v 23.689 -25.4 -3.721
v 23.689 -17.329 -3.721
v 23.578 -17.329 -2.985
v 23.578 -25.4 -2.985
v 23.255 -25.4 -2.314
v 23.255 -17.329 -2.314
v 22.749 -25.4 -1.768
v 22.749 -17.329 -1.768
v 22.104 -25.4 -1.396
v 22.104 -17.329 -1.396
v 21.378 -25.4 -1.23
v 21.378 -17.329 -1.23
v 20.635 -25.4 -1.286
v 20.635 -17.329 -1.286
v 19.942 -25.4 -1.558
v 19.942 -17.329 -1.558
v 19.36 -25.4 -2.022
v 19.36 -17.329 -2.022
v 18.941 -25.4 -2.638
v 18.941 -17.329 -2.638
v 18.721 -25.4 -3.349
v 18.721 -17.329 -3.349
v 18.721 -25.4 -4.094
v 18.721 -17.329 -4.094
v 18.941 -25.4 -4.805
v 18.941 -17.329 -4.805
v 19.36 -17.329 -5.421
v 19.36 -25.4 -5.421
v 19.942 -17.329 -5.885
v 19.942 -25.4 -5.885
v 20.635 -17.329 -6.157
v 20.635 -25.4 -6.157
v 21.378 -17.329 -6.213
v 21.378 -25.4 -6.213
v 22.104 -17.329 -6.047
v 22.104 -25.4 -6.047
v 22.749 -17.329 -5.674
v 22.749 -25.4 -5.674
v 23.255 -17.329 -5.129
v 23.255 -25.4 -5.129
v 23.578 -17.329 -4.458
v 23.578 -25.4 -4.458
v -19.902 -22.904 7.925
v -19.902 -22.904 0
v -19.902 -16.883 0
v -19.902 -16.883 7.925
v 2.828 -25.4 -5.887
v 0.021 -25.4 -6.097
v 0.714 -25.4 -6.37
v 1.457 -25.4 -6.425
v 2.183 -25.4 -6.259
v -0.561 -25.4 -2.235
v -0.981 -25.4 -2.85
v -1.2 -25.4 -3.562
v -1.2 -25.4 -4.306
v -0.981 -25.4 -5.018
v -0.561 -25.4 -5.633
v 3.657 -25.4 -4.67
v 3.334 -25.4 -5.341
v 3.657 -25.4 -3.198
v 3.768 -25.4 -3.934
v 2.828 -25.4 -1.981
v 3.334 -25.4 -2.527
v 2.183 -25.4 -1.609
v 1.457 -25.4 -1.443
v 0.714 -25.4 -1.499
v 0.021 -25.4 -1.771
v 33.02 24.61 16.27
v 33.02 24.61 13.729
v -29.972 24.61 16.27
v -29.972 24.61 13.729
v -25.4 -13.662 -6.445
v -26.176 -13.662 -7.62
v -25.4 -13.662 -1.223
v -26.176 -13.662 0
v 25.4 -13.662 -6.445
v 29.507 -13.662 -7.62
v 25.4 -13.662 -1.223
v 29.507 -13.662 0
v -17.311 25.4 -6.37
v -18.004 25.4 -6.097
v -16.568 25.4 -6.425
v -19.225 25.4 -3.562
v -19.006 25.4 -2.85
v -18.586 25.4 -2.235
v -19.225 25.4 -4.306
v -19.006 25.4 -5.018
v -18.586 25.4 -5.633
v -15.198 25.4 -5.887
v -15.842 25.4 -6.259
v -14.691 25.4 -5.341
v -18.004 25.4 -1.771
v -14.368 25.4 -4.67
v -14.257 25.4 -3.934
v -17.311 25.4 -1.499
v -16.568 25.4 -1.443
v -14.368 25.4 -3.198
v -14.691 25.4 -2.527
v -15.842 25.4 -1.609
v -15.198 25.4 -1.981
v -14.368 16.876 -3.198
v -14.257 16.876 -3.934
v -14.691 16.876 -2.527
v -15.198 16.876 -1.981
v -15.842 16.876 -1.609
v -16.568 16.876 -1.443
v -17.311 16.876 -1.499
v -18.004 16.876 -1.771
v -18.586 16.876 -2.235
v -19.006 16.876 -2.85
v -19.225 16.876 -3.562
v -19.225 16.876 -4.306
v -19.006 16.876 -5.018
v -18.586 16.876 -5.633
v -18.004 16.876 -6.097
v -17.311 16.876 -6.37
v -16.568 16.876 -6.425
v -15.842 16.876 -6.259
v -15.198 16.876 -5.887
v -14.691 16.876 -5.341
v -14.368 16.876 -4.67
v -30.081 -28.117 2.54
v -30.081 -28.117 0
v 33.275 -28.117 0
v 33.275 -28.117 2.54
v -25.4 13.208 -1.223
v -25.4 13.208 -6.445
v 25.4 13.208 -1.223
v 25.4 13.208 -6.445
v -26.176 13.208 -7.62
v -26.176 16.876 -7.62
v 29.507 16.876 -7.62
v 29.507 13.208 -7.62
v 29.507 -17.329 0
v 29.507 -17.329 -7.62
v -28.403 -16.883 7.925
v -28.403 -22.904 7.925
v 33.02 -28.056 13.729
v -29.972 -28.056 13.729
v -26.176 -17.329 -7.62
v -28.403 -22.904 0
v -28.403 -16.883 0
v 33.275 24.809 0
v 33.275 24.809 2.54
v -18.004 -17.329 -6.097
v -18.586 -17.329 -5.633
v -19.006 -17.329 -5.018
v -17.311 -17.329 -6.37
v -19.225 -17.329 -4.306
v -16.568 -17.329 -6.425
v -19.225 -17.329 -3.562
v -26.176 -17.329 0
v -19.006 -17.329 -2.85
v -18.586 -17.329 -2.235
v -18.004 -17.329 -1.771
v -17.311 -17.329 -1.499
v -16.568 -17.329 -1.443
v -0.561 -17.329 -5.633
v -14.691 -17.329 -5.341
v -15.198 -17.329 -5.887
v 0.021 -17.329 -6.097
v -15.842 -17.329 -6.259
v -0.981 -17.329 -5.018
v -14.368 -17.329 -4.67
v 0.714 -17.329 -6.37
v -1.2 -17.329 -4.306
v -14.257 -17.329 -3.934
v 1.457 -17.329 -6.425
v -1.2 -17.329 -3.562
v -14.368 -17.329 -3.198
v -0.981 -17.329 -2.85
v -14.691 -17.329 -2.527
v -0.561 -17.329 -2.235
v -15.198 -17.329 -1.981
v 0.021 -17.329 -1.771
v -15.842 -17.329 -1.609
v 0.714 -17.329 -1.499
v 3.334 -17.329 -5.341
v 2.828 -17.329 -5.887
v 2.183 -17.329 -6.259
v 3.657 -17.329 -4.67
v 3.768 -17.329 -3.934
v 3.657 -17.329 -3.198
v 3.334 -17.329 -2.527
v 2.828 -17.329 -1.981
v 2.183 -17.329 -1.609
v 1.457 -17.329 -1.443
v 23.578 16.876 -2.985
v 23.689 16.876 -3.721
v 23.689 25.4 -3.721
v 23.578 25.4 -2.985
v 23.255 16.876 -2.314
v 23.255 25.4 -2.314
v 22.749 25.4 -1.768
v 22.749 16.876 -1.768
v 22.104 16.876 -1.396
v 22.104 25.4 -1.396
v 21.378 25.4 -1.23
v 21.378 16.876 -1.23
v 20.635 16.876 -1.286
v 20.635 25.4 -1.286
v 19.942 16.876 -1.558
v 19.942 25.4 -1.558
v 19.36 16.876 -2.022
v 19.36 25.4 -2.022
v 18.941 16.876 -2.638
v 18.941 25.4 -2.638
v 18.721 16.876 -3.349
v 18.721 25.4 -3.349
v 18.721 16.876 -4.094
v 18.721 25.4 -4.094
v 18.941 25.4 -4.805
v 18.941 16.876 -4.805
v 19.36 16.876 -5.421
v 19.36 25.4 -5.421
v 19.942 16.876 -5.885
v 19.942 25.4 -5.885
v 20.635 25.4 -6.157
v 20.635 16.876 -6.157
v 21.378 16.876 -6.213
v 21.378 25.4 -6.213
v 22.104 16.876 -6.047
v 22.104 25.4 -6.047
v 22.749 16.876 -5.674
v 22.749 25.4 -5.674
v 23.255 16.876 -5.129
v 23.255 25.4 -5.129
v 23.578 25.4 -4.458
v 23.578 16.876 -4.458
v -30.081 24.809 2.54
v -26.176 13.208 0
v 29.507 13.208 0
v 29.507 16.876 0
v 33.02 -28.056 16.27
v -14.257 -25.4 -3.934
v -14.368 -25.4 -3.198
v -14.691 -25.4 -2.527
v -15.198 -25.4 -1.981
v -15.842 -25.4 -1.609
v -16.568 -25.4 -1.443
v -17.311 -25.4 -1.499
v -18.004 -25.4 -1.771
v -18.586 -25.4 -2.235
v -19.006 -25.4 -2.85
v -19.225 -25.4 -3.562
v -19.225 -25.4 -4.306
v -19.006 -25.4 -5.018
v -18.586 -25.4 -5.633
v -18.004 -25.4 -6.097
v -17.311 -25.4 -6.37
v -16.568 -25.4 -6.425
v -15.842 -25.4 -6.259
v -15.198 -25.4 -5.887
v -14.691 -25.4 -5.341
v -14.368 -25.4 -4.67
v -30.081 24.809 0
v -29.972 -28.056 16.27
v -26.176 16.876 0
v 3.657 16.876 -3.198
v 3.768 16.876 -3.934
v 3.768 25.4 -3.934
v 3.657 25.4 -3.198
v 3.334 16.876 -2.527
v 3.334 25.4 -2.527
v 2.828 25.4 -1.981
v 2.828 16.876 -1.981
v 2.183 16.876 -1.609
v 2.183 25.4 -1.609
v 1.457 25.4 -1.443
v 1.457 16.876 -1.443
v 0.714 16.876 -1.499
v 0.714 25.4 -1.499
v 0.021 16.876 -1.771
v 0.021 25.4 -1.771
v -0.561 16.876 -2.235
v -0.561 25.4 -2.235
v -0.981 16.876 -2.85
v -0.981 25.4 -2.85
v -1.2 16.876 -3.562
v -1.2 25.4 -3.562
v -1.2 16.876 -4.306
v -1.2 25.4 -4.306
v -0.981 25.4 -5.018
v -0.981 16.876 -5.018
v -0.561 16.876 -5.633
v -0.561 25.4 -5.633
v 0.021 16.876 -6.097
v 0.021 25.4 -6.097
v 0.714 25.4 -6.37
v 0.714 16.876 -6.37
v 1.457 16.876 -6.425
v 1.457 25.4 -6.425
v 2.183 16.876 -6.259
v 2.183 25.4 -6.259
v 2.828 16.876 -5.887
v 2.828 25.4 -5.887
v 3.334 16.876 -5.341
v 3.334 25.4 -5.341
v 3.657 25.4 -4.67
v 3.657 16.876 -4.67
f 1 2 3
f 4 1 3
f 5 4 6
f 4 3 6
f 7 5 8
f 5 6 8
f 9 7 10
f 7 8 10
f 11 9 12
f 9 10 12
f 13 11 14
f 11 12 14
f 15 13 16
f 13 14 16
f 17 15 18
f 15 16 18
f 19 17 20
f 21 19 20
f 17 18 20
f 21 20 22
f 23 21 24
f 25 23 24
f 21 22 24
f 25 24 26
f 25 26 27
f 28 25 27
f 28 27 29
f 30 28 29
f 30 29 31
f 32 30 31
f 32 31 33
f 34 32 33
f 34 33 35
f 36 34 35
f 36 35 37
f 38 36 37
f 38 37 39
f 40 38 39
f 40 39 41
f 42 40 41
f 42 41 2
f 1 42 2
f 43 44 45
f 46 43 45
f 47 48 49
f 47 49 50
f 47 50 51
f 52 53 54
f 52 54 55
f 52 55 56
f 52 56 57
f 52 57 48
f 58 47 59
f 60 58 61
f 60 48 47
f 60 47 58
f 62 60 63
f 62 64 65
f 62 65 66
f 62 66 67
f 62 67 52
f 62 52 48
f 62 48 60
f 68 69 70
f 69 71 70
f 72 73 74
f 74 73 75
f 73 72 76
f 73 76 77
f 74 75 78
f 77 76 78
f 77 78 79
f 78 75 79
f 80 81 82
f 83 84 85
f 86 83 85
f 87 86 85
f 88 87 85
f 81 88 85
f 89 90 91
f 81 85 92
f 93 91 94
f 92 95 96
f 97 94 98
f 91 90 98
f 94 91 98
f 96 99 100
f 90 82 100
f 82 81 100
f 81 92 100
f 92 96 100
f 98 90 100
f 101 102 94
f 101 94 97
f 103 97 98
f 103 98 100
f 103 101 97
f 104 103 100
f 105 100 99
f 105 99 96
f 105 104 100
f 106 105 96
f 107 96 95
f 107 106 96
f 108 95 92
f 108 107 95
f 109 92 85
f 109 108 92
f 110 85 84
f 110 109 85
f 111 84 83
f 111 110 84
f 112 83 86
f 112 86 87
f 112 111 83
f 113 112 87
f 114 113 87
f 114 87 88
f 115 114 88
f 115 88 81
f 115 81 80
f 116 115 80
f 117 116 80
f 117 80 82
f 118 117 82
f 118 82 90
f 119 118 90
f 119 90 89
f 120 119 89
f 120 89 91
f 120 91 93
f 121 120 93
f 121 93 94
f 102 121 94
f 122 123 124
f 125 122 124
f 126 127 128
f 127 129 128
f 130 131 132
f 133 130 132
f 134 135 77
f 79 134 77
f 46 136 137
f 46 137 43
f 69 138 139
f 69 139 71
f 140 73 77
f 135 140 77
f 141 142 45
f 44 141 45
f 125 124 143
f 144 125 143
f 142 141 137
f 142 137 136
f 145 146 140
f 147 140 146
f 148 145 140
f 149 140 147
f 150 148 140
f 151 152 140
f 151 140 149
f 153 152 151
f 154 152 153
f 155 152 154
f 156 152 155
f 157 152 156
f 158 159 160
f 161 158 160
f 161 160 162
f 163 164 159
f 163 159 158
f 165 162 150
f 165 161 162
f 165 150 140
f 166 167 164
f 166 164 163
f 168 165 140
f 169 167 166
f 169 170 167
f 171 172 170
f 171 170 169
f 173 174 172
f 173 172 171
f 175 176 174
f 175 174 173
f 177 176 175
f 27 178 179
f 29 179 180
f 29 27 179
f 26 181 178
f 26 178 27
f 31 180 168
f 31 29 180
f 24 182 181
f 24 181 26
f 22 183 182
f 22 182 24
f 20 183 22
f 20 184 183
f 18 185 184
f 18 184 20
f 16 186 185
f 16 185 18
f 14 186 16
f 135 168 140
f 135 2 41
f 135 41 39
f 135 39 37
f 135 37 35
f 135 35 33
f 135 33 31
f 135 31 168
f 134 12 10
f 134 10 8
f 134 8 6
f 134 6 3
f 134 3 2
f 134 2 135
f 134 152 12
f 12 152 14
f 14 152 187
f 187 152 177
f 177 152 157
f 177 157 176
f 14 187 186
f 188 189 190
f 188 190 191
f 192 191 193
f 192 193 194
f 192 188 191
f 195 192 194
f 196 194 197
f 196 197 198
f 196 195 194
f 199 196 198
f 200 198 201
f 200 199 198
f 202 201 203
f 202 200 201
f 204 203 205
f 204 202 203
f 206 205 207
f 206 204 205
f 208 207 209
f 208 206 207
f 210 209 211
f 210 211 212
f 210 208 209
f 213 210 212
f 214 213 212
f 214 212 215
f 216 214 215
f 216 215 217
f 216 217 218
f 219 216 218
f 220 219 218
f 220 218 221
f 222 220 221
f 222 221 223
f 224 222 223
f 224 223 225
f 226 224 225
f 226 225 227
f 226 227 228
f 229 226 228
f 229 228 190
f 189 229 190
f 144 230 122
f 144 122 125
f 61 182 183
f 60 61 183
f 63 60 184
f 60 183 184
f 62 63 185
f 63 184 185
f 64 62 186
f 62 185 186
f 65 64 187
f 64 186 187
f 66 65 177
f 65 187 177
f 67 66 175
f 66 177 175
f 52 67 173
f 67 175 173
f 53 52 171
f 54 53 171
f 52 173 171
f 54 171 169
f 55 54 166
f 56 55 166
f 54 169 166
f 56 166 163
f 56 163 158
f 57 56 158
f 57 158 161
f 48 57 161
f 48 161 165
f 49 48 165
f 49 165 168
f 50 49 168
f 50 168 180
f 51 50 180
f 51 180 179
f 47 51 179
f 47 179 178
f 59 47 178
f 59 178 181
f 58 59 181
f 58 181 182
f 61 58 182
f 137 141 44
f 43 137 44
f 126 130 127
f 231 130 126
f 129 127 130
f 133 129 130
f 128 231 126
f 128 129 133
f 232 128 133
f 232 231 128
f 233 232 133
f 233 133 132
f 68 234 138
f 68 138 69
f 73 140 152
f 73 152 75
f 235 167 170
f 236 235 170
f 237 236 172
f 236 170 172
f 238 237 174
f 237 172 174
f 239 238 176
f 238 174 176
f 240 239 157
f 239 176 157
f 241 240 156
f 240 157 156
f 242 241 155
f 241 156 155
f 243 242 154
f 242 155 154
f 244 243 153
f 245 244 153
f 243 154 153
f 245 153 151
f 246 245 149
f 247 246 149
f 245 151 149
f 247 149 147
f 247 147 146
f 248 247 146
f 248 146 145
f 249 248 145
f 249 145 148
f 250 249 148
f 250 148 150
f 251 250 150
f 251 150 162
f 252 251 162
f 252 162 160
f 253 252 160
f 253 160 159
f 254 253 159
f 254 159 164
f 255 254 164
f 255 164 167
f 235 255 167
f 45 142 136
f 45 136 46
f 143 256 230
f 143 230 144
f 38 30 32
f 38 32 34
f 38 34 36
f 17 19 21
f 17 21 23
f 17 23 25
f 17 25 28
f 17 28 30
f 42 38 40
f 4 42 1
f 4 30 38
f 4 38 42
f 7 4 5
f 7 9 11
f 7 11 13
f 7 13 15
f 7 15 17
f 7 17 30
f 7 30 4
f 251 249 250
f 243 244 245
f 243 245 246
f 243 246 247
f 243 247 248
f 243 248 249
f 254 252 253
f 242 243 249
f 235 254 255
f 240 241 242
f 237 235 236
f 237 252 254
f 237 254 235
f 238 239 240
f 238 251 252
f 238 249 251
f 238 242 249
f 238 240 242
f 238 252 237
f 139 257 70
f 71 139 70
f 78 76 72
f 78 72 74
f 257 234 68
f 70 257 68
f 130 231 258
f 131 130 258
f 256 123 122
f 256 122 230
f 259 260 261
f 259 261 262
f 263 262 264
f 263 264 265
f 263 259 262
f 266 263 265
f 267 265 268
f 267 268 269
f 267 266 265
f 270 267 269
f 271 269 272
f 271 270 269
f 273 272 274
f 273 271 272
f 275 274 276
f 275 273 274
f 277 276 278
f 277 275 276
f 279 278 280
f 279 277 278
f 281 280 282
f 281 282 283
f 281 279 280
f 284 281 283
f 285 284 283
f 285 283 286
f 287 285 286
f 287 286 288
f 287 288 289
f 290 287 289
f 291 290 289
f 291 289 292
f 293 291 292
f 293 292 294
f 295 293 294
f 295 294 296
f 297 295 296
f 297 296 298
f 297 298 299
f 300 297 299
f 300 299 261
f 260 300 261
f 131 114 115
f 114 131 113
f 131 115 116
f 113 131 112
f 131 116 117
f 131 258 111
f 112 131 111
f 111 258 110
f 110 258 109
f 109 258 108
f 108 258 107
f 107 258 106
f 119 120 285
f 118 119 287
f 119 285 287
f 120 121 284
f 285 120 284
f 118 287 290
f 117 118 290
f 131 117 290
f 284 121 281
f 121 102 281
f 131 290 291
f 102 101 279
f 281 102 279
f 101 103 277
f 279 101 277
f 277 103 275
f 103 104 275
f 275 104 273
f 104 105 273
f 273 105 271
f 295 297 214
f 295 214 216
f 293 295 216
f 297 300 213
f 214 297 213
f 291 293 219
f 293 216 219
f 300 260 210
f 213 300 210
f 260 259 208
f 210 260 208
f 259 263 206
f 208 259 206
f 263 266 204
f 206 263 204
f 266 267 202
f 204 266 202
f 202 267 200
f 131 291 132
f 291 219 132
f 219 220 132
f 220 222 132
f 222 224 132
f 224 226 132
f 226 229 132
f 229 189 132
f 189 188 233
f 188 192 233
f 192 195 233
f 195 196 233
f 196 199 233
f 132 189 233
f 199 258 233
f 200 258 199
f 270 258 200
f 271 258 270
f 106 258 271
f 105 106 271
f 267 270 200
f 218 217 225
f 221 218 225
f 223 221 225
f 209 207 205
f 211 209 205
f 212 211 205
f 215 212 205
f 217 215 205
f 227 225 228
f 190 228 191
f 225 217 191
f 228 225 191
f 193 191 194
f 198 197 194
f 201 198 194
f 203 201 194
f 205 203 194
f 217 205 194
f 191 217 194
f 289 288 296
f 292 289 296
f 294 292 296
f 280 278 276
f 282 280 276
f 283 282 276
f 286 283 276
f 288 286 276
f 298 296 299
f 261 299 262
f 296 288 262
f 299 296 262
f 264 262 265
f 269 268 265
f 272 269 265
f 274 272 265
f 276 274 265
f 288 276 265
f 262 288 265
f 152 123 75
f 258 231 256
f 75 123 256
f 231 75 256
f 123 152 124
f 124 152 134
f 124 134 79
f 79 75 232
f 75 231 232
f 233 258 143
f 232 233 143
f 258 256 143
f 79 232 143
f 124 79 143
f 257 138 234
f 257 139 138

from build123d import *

# Parameters (mm, degrees)
F0_W          = 63.3566528559
F0_H          = 52.9265124351
F1_DEPTH      = 2.54
F2_W          = 52.6668075472
F2_H          = 2.5405590422
F3_DEPTH      = 29.972
F3_DEPTH_BACK = 33.02
F4_W          = 55.6830130517
F4_H          = 3.6676051095
F5_DEPTH      = 7.62
F6_R          = 2.498100457
F7_DEPTH      = 25.4
F7_DEPTH_BACK = 25.4
F8_W          = 26.8697123975
F8_H          = 5.2229278954
F9_DEPTH      = 25.4
F9_DEPTH_BACK = 25.4
F10_W         = 8.5002798587
F10_H         = 6.0210302472
F11_DEPTH     = 7.9248


# Not quite as in the source:
# - the program builds the solid bodies; features that only make, move or delete a surface that nothing else refers to are left out


with BuildPart() as f1:
    # F0 (on Top) → F1 (new body)
    with BuildSketch(Plane.XY):
        with Locations((1.5970468521, -1.6539534554)):
            Rectangle(F0_W, F0_H)
    extrude(amount=F1_DEPTH)

    # F4 (on Top) → F5 (join)
    with BuildSketch(Plane.XY):
        with Locations((1.6654524952, -15.4954805039)):
            Rectangle(F4_W, F4_H)
        with Locations((1.6654524952, 15.0418034755)):
            Rectangle(F4_W, F4_H)
    extrude(amount=-F5_DEPTH)

    # F6 (on Front) → F7 (join, two sides)
    with BuildSketch(Plane.XZ) as f7_sk:
        with Locations((21.1912784725, -3.7213952746)):
            Circle(F6_R)
        with Locations((-16.7551450431, -3.9340448566)):
            Circle(F6_R)
        with Locations((1.2700000079, -3.9340448566)):
            Circle(F6_R)
    extrude(amount=F7_DEPTH)
    extrude(f7_sk.sketch, amount=-F7_DEPTH_BACK)

    # F8 (on Right) → F9 (cut, two sides)
    with BuildSketch(Plane.YZ) as f9_sk:
        with Locations((-0.226829201, -3.8340105093)):
            Rectangle(F8_W, F8_H)
    extrude(amount=-F9_DEPTH, mode=Mode.SUBTRACT)
    extrude(f9_sk.sketch, amount=F9_DEPTH_BACK, mode=Mode.SUBTRACT)


with BuildPart() as f3:
    # F2 (on Right) → F3 (new body, two sides)
    with BuildSketch(Plane.YZ) as f3_sk:
        with Locations((-1.722917892, 14.9993023369)):
            Rectangle(F2_W, F2_H)
    extrude(amount=-F3_DEPTH)
    extrude(f3_sk.sketch, amount=F3_DEPTH_BACK)


with BuildPart() as f11:
    # F10 (on Top) → F11 (new body)
    with BuildSketch(Plane.XY):
        with Locations((-24.1524232551, -19.89361085)):
            Rectangle(F10_W, F10_H)
    extrude(amount=F11_DEPTH)


solid = Compound([f1.part, f3.part, f11.part])
